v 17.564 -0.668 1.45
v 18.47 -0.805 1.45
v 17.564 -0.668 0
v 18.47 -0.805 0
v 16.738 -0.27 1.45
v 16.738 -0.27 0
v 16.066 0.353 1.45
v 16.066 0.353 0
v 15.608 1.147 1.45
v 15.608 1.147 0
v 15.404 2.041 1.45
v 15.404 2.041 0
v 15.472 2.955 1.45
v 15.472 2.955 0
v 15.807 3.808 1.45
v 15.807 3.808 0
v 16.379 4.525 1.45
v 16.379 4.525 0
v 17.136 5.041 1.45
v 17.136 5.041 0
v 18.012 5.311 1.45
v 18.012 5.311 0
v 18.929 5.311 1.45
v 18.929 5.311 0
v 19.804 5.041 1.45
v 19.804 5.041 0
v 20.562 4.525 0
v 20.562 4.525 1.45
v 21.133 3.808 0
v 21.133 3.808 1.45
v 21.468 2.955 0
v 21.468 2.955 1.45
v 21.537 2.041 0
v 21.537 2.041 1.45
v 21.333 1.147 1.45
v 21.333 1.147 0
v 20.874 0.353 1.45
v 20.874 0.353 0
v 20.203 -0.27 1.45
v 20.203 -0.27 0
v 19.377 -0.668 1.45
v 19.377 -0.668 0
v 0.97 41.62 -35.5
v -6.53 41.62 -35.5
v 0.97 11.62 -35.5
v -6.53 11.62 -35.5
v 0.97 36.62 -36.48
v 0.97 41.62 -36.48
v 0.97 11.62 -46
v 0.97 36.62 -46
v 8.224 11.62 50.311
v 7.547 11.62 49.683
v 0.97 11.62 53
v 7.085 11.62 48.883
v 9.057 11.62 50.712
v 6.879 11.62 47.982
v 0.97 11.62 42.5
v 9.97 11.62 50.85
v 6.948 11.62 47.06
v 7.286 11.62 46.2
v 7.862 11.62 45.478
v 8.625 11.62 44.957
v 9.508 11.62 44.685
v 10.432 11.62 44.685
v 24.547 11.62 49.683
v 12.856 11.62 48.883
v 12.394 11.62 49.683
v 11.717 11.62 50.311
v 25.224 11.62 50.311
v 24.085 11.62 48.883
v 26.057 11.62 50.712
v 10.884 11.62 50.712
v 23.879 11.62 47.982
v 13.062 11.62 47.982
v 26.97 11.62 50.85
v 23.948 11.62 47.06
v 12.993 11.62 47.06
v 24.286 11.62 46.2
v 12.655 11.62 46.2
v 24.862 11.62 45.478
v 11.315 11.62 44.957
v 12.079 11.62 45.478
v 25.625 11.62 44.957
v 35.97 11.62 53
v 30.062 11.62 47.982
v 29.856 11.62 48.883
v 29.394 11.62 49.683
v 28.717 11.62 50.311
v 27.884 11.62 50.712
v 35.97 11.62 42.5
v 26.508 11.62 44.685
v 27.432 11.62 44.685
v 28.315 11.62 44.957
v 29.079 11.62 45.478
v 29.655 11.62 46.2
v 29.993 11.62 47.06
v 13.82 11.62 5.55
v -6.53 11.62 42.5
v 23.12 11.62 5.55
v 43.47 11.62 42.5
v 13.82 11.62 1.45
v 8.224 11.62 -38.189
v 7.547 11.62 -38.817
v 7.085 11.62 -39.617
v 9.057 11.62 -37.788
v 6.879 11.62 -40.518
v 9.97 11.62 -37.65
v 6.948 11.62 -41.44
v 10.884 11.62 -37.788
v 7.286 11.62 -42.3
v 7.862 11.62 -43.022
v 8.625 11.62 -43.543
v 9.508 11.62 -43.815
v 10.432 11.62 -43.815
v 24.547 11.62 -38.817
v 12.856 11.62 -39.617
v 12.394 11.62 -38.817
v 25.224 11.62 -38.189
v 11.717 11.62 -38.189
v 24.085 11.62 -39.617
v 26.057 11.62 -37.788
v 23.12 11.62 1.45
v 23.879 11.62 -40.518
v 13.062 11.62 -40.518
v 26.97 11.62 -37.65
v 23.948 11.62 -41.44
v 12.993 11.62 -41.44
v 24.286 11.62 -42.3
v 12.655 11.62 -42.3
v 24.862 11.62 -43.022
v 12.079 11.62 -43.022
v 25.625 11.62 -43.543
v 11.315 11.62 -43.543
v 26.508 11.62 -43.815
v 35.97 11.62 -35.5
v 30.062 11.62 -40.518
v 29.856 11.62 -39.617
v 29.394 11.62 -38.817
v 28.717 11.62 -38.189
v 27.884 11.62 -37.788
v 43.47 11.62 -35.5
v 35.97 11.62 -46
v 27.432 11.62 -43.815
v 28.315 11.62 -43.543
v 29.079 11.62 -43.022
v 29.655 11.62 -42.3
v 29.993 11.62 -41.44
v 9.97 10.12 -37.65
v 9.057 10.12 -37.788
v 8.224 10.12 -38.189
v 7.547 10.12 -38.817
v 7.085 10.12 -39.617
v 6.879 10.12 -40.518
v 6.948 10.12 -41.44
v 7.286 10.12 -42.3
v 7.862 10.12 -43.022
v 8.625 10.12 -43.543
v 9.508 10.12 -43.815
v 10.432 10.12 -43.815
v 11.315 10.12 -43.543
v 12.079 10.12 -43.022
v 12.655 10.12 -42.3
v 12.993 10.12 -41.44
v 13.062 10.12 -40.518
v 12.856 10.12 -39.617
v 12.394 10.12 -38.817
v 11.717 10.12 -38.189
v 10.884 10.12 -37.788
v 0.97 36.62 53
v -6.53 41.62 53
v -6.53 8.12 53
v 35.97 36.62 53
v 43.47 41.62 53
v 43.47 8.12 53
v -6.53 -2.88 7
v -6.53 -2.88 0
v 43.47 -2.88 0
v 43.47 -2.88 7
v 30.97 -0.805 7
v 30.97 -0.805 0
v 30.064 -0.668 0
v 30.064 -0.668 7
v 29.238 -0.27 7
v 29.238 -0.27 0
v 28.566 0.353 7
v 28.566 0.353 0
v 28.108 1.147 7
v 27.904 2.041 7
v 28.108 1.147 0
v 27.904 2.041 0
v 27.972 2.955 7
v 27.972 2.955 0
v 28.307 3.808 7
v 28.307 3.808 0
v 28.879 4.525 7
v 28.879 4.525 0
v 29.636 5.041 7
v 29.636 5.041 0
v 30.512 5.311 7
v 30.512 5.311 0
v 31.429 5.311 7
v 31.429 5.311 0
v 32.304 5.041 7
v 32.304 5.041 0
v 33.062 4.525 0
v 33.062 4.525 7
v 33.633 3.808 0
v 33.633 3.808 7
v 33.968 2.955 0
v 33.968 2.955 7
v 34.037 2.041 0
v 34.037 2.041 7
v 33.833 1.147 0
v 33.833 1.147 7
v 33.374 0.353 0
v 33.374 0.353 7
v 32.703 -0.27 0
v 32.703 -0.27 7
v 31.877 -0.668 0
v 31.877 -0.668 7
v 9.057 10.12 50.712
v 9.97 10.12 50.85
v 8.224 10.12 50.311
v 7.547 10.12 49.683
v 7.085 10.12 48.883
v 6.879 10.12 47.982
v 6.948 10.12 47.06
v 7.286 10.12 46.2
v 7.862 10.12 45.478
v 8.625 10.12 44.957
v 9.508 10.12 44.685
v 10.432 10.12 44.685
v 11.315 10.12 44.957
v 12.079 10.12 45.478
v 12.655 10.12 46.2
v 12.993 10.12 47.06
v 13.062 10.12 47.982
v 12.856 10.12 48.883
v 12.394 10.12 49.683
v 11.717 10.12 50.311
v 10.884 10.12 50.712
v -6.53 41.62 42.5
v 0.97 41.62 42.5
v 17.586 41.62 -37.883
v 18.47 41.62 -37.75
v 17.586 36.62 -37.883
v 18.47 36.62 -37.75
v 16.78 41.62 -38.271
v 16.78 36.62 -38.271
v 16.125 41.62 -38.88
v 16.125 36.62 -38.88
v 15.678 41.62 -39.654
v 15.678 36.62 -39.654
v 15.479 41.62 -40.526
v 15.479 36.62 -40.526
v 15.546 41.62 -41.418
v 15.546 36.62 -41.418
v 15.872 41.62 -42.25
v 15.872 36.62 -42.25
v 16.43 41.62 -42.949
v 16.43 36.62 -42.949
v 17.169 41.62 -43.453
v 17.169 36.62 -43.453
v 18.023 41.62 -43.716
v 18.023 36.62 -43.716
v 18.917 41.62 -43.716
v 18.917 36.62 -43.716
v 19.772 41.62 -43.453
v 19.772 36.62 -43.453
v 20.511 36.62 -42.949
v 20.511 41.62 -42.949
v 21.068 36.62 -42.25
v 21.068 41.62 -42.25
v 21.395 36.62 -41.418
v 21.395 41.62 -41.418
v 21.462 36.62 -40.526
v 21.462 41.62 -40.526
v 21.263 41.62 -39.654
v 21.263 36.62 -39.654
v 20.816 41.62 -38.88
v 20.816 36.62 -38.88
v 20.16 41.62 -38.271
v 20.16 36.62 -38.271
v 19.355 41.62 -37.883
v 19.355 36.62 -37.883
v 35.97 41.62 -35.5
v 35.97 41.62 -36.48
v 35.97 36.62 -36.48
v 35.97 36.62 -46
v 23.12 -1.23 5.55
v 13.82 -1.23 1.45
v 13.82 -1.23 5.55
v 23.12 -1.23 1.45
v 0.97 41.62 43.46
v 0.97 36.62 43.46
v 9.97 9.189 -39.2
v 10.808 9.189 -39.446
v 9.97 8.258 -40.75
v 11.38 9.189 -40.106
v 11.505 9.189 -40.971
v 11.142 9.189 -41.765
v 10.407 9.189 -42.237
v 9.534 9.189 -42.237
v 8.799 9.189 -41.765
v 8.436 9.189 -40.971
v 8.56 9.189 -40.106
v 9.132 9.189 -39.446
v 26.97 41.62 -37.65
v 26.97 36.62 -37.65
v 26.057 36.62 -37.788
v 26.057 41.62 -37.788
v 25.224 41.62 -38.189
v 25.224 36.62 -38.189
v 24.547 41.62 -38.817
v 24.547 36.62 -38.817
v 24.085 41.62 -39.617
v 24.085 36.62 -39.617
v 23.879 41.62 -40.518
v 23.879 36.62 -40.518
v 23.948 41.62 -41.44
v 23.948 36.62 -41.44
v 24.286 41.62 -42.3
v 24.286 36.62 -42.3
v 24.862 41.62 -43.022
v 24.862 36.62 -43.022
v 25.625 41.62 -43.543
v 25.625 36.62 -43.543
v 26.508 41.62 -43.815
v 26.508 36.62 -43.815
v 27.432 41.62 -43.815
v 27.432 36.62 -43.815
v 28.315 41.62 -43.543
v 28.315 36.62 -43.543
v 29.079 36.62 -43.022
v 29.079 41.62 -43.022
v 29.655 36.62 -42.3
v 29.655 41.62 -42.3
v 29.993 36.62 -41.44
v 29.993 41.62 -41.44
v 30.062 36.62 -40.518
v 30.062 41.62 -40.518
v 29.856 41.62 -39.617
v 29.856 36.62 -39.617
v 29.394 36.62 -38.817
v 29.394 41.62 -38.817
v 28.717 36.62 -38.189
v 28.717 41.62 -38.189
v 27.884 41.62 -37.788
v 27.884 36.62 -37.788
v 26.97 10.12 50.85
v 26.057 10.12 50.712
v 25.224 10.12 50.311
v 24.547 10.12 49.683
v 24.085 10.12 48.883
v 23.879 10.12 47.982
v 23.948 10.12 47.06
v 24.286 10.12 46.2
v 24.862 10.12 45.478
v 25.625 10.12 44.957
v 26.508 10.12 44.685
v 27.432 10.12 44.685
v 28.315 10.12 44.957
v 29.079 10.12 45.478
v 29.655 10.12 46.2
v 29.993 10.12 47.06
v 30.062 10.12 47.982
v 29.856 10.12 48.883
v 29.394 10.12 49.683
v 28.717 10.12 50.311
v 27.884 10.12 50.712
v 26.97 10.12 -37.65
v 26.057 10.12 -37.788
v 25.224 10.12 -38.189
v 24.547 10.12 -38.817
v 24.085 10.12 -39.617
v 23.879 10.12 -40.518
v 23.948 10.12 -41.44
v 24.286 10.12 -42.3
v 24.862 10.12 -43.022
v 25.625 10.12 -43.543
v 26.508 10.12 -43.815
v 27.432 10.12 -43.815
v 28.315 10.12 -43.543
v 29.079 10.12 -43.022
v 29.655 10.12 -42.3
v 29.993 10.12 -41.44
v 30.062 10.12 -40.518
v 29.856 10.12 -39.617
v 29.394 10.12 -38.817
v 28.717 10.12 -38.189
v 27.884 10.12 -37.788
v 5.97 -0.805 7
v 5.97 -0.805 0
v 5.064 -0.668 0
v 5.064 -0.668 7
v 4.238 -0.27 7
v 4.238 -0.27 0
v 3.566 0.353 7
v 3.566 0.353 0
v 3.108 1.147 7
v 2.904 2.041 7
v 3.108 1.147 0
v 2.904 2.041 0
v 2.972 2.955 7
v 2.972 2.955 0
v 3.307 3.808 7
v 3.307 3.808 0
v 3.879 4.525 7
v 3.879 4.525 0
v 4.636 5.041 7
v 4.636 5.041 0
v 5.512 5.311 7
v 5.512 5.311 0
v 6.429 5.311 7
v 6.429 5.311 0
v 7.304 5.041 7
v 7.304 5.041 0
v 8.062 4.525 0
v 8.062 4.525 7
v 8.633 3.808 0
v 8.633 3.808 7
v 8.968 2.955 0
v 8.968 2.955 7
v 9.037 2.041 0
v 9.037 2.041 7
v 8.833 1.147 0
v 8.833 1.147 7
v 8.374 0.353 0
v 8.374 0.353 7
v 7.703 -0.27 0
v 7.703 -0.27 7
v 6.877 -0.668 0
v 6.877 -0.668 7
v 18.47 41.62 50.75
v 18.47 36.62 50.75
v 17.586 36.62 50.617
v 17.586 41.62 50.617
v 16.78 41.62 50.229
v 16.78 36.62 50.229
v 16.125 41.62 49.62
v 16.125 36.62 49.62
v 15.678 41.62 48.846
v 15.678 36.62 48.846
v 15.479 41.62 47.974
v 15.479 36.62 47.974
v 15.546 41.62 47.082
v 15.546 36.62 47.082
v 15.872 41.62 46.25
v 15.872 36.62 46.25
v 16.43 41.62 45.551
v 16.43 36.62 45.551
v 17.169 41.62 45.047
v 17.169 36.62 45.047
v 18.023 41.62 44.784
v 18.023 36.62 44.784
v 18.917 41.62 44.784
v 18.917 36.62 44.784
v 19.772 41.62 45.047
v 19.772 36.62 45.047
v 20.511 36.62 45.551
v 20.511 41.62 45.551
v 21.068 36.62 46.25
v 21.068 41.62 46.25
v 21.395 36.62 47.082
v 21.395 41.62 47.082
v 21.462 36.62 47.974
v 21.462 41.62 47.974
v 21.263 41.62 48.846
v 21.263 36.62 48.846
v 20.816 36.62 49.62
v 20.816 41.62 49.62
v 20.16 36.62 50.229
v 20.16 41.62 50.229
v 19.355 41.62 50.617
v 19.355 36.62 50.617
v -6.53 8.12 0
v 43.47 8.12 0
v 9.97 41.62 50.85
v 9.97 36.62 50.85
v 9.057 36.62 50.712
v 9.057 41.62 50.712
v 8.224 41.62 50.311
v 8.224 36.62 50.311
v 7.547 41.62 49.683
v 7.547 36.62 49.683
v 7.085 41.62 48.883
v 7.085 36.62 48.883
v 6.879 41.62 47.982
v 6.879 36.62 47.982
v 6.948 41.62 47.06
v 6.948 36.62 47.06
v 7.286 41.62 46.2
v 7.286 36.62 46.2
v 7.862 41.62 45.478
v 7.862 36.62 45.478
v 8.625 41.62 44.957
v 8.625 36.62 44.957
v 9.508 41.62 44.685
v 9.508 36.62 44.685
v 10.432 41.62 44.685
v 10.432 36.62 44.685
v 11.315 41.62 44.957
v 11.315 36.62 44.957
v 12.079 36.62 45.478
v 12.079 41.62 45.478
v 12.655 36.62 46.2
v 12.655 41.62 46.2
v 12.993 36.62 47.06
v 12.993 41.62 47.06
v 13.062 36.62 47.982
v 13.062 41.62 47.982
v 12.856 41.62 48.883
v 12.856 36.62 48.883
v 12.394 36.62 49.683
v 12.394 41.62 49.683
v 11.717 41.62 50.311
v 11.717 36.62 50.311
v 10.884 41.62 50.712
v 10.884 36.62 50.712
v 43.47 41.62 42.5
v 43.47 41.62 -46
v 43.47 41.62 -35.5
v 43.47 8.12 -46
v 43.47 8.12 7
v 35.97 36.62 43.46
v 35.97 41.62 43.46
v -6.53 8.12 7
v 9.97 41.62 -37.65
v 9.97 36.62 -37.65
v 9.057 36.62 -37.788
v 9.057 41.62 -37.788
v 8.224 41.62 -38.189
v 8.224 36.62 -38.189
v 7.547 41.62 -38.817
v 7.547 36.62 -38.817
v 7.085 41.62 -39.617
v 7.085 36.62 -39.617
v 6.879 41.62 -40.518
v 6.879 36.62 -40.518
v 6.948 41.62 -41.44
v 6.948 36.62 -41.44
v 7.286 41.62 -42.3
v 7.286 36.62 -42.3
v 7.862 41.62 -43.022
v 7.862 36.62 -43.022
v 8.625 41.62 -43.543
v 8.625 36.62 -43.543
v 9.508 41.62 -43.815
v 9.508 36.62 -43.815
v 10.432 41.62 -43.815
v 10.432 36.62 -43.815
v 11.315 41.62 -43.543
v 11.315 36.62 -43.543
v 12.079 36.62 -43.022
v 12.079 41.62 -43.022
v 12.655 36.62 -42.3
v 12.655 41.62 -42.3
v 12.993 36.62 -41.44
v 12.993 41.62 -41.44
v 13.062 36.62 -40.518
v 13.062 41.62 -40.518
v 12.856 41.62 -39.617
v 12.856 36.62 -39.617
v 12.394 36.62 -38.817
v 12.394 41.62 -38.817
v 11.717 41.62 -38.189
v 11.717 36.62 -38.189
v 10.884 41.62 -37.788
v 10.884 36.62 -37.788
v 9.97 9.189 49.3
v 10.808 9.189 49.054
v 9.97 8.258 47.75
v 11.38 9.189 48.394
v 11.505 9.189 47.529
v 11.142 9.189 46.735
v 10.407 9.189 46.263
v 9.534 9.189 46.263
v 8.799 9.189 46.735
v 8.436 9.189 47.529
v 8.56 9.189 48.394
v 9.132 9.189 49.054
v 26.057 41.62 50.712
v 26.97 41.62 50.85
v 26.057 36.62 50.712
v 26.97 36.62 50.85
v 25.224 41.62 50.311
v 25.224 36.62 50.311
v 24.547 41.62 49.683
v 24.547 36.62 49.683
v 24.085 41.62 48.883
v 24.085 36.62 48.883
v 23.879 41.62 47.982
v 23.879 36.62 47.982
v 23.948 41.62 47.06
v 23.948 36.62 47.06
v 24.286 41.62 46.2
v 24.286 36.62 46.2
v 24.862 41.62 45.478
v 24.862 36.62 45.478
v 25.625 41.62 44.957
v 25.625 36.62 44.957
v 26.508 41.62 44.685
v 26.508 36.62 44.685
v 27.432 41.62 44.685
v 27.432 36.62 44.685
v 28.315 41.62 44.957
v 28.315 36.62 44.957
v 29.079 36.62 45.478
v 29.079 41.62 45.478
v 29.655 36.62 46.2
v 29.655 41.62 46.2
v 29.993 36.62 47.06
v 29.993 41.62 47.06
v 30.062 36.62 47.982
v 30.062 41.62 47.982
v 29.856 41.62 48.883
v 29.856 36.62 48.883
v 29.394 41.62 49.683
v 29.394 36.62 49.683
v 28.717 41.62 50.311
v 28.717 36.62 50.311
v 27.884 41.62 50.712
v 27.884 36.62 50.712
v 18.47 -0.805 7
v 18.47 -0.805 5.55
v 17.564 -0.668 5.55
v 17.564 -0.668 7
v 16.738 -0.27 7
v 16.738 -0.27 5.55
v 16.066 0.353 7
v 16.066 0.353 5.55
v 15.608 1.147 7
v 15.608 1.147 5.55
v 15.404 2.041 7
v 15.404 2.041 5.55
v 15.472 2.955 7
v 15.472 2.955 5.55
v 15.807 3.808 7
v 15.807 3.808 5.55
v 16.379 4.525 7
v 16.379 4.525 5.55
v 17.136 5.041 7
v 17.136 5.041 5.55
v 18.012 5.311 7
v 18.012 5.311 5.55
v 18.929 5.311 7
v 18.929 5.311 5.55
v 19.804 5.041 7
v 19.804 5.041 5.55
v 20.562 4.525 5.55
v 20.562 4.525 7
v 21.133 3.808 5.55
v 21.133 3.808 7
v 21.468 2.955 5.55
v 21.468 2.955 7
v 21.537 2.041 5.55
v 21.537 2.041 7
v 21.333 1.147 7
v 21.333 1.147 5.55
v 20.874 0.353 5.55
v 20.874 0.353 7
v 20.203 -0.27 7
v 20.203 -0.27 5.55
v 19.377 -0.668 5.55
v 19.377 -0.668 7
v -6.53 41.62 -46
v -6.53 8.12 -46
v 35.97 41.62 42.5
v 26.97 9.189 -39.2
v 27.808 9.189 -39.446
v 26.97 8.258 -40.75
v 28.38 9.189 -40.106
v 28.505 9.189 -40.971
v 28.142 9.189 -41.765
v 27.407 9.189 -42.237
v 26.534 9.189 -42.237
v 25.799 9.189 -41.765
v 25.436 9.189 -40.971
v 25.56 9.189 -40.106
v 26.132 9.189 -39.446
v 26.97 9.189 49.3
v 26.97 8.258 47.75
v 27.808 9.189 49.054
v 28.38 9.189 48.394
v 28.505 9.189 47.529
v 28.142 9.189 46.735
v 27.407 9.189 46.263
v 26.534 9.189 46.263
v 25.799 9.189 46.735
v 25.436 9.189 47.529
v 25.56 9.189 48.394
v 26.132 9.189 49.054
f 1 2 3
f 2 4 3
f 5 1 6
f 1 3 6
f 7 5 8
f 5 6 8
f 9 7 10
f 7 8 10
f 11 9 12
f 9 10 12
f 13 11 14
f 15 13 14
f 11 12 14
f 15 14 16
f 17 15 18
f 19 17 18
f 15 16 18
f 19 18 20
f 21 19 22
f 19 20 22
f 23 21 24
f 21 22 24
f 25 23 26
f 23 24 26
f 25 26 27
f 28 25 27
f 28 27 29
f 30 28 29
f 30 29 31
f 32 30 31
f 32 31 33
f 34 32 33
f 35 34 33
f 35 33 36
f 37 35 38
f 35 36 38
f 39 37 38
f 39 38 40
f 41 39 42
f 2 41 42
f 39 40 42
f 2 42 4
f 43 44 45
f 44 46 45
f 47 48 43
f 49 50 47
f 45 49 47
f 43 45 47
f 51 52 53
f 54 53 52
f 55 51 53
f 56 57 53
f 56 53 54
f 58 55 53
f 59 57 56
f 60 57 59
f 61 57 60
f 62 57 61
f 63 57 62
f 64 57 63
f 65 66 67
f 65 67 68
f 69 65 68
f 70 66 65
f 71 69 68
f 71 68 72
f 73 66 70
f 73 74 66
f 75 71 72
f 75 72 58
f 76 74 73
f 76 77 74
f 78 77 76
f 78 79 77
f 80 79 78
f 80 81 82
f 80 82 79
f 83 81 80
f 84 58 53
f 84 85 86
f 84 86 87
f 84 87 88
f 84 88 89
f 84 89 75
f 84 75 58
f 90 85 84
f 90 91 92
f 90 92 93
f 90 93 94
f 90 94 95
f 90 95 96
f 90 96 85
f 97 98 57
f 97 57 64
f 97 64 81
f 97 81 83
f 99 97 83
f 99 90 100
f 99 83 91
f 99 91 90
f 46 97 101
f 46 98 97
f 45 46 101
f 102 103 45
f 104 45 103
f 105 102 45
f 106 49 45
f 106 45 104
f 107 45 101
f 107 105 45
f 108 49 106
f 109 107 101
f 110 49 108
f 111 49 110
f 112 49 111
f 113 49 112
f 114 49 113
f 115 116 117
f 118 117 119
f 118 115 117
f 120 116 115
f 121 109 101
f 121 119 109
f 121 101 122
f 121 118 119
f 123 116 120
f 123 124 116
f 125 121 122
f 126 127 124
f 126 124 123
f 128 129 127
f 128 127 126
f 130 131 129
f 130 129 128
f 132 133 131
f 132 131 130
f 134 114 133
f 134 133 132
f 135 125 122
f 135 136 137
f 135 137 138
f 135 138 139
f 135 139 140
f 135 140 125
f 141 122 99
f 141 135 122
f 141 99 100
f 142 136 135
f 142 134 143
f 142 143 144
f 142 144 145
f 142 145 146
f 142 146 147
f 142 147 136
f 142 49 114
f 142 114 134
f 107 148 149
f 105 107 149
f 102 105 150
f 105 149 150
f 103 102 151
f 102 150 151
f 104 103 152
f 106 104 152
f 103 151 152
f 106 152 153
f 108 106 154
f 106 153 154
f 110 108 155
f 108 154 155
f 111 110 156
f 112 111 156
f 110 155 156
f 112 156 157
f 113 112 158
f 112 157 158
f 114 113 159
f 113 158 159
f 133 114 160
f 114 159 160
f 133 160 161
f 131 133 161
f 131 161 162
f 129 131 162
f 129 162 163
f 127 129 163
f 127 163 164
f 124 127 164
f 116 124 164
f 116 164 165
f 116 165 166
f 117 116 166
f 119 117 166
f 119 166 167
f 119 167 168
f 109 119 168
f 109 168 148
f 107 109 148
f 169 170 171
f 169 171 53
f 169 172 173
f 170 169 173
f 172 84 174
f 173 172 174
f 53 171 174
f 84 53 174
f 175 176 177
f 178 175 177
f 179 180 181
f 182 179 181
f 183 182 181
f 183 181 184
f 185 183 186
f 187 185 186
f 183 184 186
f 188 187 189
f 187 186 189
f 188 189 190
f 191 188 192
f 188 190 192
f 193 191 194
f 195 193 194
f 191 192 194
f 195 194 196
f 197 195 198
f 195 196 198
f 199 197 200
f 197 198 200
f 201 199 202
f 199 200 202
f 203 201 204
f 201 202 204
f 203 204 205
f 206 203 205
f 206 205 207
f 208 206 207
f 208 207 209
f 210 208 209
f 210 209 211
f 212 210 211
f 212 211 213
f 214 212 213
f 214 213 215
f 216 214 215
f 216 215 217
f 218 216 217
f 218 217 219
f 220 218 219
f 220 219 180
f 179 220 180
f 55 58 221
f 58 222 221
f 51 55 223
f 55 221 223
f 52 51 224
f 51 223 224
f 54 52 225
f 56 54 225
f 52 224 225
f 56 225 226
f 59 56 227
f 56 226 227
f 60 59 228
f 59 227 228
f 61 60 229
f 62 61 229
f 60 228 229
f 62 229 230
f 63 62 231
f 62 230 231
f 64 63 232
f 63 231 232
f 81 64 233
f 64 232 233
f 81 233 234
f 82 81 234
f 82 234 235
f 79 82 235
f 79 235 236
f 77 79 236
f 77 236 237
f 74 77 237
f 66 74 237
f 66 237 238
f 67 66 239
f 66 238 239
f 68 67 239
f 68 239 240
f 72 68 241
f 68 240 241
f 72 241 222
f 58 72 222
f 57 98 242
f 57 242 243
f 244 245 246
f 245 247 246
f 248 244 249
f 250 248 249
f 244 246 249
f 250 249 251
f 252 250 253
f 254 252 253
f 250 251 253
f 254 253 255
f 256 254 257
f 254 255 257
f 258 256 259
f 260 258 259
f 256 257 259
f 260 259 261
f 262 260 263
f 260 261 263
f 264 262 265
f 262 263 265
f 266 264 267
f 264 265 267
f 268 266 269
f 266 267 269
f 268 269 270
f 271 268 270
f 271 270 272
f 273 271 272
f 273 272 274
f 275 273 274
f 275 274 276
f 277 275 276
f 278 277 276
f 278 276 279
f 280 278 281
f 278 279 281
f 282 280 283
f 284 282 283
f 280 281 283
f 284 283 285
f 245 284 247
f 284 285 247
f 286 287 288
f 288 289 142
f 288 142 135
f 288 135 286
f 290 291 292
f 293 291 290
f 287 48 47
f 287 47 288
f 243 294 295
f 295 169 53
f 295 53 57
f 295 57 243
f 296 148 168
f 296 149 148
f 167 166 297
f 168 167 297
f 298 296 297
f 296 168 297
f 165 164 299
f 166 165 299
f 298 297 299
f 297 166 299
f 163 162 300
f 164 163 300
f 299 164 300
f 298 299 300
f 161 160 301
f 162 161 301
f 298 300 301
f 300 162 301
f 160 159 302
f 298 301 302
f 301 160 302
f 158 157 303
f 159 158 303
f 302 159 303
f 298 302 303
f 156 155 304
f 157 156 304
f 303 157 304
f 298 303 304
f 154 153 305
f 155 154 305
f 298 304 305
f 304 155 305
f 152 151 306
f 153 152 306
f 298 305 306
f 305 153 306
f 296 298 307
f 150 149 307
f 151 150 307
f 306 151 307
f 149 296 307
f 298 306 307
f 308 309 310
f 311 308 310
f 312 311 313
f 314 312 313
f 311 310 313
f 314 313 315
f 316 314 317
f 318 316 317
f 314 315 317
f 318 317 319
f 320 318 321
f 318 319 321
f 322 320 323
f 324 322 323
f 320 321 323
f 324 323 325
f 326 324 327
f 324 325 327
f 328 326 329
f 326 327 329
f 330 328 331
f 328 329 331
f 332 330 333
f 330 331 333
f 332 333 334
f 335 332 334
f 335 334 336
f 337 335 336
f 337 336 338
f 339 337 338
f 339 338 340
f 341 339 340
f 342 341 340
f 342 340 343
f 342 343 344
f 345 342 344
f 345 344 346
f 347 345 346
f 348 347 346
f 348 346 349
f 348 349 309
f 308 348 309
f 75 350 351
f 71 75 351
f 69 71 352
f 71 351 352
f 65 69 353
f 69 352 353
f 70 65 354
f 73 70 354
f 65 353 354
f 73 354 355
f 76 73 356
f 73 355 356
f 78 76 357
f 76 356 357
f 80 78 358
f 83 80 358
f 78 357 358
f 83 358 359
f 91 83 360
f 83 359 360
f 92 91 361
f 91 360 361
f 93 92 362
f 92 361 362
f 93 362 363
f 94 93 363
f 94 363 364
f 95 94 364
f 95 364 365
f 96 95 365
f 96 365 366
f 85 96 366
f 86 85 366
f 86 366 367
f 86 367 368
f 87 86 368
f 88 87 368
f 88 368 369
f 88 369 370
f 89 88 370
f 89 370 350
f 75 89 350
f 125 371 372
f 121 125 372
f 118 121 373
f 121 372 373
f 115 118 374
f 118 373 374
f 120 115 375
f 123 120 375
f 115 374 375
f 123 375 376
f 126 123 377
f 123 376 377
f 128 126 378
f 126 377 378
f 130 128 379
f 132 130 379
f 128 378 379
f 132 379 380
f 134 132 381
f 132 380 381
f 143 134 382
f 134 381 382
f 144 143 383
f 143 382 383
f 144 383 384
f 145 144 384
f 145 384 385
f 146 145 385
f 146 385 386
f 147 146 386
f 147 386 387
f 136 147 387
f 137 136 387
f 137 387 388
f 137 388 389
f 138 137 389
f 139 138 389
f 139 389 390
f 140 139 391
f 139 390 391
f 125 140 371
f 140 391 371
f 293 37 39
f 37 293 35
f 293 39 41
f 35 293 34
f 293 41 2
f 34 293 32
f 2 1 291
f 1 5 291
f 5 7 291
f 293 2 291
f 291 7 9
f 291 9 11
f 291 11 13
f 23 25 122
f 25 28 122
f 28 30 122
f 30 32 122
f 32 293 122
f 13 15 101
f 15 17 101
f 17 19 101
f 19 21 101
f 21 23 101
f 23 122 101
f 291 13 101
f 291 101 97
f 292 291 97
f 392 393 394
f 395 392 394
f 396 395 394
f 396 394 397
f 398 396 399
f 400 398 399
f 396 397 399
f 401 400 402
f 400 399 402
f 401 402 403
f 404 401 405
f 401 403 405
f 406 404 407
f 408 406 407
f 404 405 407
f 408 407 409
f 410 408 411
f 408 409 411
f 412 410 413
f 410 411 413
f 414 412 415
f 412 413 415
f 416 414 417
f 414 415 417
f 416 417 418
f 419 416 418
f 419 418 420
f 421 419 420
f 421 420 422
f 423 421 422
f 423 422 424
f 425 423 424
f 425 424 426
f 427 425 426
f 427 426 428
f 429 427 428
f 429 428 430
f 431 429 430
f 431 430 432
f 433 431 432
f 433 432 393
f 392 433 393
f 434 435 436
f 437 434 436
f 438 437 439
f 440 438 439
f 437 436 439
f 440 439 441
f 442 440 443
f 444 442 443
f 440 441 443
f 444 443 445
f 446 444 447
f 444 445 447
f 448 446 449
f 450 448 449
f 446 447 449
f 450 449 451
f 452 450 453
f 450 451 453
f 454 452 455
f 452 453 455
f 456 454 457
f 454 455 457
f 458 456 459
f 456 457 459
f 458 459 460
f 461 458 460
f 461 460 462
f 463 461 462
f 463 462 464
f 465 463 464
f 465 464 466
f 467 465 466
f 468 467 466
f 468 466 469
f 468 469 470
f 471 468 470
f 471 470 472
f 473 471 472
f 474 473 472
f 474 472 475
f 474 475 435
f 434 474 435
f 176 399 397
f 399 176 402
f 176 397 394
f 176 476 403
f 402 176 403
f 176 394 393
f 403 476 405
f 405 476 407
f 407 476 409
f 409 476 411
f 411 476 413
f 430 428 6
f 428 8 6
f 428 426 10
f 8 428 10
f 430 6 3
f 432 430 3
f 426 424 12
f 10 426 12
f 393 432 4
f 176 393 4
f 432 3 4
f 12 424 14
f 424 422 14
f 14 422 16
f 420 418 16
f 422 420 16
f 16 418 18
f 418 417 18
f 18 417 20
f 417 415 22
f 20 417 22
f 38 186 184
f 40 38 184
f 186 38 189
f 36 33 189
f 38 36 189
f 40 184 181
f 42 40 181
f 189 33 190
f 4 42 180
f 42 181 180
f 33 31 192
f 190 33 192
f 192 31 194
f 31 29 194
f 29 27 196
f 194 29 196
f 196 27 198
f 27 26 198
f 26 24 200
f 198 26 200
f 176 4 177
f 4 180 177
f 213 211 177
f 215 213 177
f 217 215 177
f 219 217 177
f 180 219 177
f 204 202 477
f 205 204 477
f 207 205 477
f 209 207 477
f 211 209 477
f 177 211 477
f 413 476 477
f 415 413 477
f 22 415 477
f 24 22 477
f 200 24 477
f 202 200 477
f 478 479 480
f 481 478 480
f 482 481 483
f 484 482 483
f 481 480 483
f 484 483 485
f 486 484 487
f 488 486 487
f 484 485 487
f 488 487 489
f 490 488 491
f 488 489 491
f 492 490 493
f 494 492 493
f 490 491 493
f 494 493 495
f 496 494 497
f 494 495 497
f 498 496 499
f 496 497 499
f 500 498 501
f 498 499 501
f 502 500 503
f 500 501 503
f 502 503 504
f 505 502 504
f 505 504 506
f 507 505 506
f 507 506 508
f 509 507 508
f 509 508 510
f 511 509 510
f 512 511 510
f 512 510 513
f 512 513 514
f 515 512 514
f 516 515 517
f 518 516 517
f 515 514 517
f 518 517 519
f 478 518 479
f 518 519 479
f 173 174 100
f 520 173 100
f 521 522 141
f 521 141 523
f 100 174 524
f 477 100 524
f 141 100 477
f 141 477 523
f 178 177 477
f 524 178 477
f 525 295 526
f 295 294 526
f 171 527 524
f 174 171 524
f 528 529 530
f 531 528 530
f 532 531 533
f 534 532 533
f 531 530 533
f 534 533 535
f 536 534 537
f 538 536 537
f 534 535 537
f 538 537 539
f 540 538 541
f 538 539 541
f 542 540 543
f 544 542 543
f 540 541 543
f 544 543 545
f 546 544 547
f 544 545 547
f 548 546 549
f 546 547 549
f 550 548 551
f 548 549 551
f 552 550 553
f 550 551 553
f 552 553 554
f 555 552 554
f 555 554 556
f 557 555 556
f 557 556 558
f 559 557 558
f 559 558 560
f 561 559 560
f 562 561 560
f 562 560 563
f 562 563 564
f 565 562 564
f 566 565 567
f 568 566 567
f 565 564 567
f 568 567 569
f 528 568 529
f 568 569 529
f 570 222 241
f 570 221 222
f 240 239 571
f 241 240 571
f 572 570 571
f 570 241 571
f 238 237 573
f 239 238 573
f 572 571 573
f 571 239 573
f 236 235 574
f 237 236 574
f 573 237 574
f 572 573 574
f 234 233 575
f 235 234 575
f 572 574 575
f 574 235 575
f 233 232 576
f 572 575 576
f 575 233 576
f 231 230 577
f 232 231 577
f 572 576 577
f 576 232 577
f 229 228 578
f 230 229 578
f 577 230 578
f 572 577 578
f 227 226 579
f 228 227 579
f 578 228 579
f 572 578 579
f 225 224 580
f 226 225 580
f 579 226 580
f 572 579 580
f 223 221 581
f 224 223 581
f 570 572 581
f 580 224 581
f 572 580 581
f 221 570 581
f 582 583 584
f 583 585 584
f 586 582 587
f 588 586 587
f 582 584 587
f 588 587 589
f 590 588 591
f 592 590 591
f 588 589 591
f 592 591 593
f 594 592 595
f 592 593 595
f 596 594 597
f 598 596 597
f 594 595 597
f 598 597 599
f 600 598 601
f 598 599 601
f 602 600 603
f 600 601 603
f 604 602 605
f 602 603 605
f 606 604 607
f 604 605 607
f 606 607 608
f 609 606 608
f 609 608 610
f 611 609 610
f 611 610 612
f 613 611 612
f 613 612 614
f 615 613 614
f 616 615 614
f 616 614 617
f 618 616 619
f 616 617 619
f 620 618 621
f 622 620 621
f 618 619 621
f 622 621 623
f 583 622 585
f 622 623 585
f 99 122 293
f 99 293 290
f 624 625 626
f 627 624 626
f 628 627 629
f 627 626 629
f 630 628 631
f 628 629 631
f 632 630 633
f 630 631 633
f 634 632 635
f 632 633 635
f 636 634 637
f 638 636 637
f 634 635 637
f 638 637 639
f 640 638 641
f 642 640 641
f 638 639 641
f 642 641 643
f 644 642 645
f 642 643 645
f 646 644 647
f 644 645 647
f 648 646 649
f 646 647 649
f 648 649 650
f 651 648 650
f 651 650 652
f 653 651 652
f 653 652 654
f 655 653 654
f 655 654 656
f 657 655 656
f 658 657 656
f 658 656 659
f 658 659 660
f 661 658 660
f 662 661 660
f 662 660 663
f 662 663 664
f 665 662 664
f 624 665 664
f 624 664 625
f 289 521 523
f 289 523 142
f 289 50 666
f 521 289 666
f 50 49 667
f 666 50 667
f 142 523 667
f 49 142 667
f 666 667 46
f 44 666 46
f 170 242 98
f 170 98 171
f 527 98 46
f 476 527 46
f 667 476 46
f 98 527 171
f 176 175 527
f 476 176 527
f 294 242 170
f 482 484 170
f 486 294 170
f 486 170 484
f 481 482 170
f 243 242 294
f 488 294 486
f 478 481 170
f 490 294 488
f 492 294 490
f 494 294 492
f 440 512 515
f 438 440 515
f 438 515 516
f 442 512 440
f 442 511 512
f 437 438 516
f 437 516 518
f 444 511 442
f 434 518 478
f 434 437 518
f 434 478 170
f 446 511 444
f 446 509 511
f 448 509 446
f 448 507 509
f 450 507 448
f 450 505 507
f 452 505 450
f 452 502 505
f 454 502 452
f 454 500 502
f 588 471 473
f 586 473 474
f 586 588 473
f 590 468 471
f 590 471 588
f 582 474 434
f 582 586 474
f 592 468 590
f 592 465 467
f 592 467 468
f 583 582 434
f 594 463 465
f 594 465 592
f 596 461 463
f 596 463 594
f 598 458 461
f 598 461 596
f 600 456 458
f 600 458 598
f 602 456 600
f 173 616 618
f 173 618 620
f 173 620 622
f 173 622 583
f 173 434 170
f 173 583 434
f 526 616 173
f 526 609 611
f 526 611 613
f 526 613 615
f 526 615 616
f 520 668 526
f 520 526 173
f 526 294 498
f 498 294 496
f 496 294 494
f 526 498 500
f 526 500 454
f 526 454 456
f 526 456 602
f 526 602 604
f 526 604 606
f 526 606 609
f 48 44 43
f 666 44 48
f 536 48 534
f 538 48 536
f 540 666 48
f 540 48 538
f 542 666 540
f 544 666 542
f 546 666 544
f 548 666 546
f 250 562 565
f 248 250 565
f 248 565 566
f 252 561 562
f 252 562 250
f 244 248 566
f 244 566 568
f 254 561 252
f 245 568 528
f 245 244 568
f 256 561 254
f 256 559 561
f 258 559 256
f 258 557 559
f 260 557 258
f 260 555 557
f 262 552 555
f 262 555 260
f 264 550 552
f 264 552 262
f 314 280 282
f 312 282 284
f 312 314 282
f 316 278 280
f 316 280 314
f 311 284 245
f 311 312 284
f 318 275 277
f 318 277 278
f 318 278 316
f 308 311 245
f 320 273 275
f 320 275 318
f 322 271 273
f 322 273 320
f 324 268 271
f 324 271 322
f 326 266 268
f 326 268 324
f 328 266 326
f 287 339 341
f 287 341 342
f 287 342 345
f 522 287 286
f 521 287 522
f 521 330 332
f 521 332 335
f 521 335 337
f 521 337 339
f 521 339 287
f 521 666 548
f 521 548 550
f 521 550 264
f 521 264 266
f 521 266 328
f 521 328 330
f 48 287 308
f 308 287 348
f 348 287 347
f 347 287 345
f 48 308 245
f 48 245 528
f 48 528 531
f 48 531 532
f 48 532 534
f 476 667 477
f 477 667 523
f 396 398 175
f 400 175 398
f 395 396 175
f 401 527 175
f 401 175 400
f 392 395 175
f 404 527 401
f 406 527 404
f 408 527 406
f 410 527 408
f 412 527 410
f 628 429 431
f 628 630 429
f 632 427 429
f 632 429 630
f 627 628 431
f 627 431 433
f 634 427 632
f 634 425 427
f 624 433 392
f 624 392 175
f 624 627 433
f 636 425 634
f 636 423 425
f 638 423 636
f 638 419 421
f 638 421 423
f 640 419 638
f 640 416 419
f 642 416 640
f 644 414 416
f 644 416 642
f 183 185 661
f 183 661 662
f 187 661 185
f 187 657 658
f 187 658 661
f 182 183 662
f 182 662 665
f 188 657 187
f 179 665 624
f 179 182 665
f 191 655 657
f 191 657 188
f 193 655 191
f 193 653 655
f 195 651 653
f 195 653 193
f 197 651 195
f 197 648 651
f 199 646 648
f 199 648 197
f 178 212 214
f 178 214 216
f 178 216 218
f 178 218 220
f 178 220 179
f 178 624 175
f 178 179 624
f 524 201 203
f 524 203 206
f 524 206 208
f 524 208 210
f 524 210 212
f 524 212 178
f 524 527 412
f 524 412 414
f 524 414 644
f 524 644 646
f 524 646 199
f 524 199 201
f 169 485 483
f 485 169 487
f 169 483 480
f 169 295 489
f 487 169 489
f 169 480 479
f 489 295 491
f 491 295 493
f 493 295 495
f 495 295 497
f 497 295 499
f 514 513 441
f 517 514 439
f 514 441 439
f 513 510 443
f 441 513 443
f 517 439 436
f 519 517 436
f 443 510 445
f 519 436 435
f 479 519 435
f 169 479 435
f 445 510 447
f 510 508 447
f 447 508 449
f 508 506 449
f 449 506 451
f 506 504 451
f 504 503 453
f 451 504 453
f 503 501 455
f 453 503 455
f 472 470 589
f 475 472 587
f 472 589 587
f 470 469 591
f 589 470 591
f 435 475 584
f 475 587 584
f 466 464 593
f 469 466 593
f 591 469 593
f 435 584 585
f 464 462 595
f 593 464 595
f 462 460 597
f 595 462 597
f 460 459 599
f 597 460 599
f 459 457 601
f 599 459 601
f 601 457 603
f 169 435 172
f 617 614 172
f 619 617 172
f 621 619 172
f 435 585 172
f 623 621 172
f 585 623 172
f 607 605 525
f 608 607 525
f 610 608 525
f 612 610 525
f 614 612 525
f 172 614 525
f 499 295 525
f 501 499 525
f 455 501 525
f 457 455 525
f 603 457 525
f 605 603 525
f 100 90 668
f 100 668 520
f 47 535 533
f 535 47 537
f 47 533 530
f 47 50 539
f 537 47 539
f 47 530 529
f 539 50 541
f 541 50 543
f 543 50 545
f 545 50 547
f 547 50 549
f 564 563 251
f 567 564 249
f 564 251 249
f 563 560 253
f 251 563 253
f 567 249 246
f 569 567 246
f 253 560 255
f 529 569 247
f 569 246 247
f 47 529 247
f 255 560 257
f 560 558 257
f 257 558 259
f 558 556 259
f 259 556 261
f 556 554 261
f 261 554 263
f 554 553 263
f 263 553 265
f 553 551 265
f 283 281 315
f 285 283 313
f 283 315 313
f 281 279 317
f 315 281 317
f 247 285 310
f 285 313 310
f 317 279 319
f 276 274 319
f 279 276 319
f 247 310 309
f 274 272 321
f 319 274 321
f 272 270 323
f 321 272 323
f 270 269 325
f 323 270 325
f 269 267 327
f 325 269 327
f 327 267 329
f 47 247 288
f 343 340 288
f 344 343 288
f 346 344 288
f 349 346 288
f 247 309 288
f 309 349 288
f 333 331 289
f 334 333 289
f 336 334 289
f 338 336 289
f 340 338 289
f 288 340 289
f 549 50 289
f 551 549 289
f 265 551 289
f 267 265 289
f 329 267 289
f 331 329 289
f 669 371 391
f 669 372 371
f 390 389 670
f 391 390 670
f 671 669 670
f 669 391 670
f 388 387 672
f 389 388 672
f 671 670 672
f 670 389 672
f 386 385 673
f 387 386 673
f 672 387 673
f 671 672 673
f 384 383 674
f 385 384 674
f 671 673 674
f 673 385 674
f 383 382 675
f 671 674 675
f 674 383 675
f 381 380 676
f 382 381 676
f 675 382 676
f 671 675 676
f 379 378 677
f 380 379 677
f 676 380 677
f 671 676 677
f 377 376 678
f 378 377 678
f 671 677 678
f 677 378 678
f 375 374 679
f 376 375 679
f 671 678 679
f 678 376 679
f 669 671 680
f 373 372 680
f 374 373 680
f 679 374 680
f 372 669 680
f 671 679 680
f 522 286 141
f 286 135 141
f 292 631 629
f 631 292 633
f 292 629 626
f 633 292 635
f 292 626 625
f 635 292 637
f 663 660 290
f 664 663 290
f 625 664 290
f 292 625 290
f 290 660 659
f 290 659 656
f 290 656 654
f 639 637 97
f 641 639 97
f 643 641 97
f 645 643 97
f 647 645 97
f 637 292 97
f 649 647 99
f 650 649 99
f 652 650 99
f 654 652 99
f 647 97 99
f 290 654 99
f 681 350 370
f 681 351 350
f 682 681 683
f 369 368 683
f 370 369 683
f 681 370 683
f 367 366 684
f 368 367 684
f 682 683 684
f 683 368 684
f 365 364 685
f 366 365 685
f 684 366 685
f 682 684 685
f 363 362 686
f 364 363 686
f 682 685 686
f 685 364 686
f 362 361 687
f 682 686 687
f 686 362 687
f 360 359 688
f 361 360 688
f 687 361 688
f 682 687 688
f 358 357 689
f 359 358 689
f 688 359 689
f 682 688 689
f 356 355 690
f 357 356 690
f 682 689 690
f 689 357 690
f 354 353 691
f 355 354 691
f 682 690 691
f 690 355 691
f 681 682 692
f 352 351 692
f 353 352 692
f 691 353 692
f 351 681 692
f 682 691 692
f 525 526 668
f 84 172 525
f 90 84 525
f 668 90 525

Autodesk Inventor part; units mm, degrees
ref_plane "YZ Plane" through (0, 0, 0) normal (1, 0, 0) x (0, 1, 0)
ref_plane "XZ Plane" through (0, 0, 0) normal (0, 1, 0) x (-1, 0, 0)
ref_plane "XY Plane" through (0, 0, 0) normal (0, 0, 1) x (1, 0, 0)
sketch "Skizze1" plane through (0, 0, 0) normal (0, 0, 1) x (1, 0, 0)
  line L0 (-6.5297, -2.8796) -> (43.4703, -2.8796)
  line L1 (43.4703, -2.8796) -> (43.4703, 8.1204)
  line L2 (43.4703, 8.1204) -> (-6.5297, 8.1204)
  line L3 (-6.5297, 8.1204) -> (-6.5297, -2.8796)
  point P0 (0, 0)
  dimension "d0" = 50
  dimension "d1" = 11
extrude "Extrusion1" add sketch "Skizze1" along normal blind 7
sketch "Skizze2" plane through (-6.5297, 8.1204, 0) normal (0, 1, 0) x (1, 0, 0)
  line L0 (29.65, -5.55) -> (20.35, -5.55)
  line L1 (20.35, -5.55) -> (20.35, -1.45)
  line L2 (20.35, -1.45) -> (29.65, -1.45)
  line L3 (29.65, -1.45) -> (29.65, -5.55)
  line L4 (50, -7) -> (0, -7) projected
  line L5 (50, 0) -> (50, -7) projected
  line L6 (0, 0) -> (0, -7) projected
  point P0 (6.5297, 0)
  dimension "d4" = 9.3
  dimension "d5" = 4.1
  dimension "d6" = 1.45
  dimension "d7" = 20.35
  dimension "d8" = 20.35
extrude "Extrusion2" cut sketch "Skizze2" against normal blind 9.35
sketch "Skizze3" plane through (0, 0, 7) normal (0, 0, 1) x (1, 0, 0)
  line L0 (-6.5297, 8.1204) -> (-6.5297, -2.8796) projected
  line L1 (43.4703, 8.1204) -> (-6.5297, 8.1204) projected
  point P0 (0, 0)
  point P1 (5.9703, 2.2704)
  point P2 (18.4703, 2.2704)
  point P3 (30.9703, 2.2704)
  dimension "d11" = 12.5
  dimension "d12" = 12.5
  dimension "d13" = 12.5
  dimension "d14" = 5.85
hole "Bohrung1" at (5.9703, 2.2704, 7) at (18.4703, 2.2704, 7) at (30.9703, 2.2704, 7) direction (0, 0, -1) diameter 6.15 end through all
sketch "Skizze4" plane through (-6.5297, 8.1204, 0) normal (0, 1, 0) x (1, 0, 0)
  point P0 (6.5297, 0)
sketch "Skizze5" plane through (-6.5297, 8.1204, 0) normal (0, 1, 0) x (1, 0, 0)
  line L0 (50, 0) -> (0, 0) projected
  line L1 (0, 0) -> (0, -53.0037)
  line L2 (0, -53) -> (50, -53)
  line L3 (50, -53) -> (50, 46)
  line L4 (50, 46) -> (0, 46)
  line L5 (0, 46) -> (0, -53)
  point P0 (6.5297, 0)
  dimension "d22" = 50
  dimension "d23" = 99
  dimension "d24" = 46
extrude "Extrusion3" add sketch "Skizze5" along normal blind 3.5
sketch "Skizze6" plane through (-6.5297, 11.6204, 0) normal (0, 1, 0) x (1, 0, 0)
  line L0 (29.65, -1.45) -> (29.65, -5.55) projected
  line L1 (29.65, -1.45) -> (20.35, -1.45)
  line L2 (20.35, -1.45) -> (20.35, -5.55)
  line L3 (20.35, -5.55) -> (29.65, -5.55)
  line L4 (29.65, -5.55) -> (29.65, -1.45)
  point P0 (6.5297, 0)
extrude "Extrusion4" cut sketch "Skizze6" against normal blind 3.5
sketch "Skizze7" plane through (-6.5297, 11.6204, 0) normal (0, 1, 0) x (1, 0, 0)
  line L0 (0, -53) -> (50, -53) projected
  line L1 (50, -53) -> (42.5, -53)
  line L2 (42.5, -53) -> (42.5, -42.5)
  line L3 (42.5, -42.5) -> (50, -42.5)
  line L4 (50, -42.5) -> (50, -53)
  line L5 (0, -53) -> (7.5, -53)
  line L6 (7.5, -53) -> (7.5, -42.5)
  line L7 (7.5, -42.5) -> (0, -42.5)
  line L8 (0, -42.5) -> (0, -53)
  line L9 (0, 46) -> (0, -53) projected
  line L10 (0, 46) -> (7.5, 46)
  line L11 (7.5, 46) -> (7.5, 35.5)
  line L12 (7.5, 35.5) -> (0, 35.5)
  line L13 (0, 35.5) -> (0, 46)
  line L14 (50, -53) -> (50, 46) projected
  line L15 (50, 46) -> (42.5, 46)
  line L16 (42.5, 46) -> (42.5, 35.5)
  line L17 (42.5, 35.5) -> (50, 35.5)
  line L18 (50, 35.5) -> (50, 46)
  point P0 (6.5297, 0)
  dimension "d29" = 7.5
  dimension "d30" = 10.5
  dimension "d31" = 7.5
  dimension "d32" = 10.5
  dimension "d33" = 7.5
  dimension "d34" = 10.5
  dimension "d35" = 7.5
  dimension "d36" = 10.5
extrude "Extrusion5" add sketch "Skizze7" along normal blind 25
sketch "Skizze8" plane through (0.9703, 11.6204, -35.5) normal (1, 0, 0) x (0, 0, -1)
  point P0 (-35.5, -11.6204)
sketch "Skizze9" plane through (-6.5297, 36.6204, 0) normal (0, 1, 0) x (1, 0, 0)
  line L0 (50, -42.5) -> (50, 35.5) projected
  line L1 (0, 46) -> (50, 46)
  line L2 (50, 46) -> (50, 35.5)
  line L3 (50, 35.5) -> (0, 35.5)
  line L4 (0, 35.5) -> (0, 46)
  line L5 (50, -53) -> (50, -7) projected
  line L6 (0, -42.5) -> (50, -42.5)
  line L7 (50, -42.5) -> (50, -53)
  line L8 (50, -53) -> (0, -53)
  line L9 (0, -53) -> (0, -42.5)
  line L10 (50, -42.5) -> (42.5, -42.5) projected
  point P0 (6.5297, 0)
  dimension "d75" = 0
extrude "Extrusion6" add sketch "Skizze9" along normal blind 5
sketch "Skizze10" plane through (-6.5297, 41.6204, 0) normal (0, 1, 0) x (1, 0, 0)
  line L0 (50, 46) -> (0, 46) projected
  line L1 (0, -53) -> (50, -53) projected
  line L2 (42.5, -42.5) -> (42.5, -53) projected
  line L3 (42.5, 46) -> (42.5, 35.5) projected
  line L4 (7.5, 35.5) -> (7.5, 46) projected
  line L5 (7.5, -53) -> (7.5, -42.5) projected
  point P0 (6.5297, 0)
  point P1 (15.7518, 40.75)
  point P2 (25, 40.75)
  point P3 (33.5, 40.75)
  point P4 (15.6745, -47.75)
  point P5 (25, -47.75)
  point P6 (33.5, -47.75)
  dimension "d41" = 5.25
  dimension "d42" = 5.25
  dimension "d43" = 5.25
  dimension "d44" = 5.25
  dimension "d45" = 5.25
  dimension "d46" = 5.25
  dimension "d47" = 9
  dimension "d50" = 9
  dimension "d76" = 17.5
  dimension "d77" = 17.5
hole "Bohrung2" at (18.4703, 41.6204, 47.75) at (18.4703, 41.6204, -40.75) direction (0, -1, 0) diameter 6 depth 10 tip angle 118
sketch "Skizze11" plane through (-6.5297, 41.6204, 0) normal (0, 1, 0) x (1, 0, 0)
  line L0 (7.5, -53) -> (7.5, -42.5) projected
  line L1 (42.5, -42.5) -> (42.5, -53) projected
  line L2 (50, -42.5) -> (0, -42.5) projected
  line L3 (50, 46) -> (0, 46) projected
  line L4 (42.5, 46) -> (42.5, 35.5) projected
  line L5 (7.5, 35.5) -> (7.5, 46) projected
  point P0 (6.5297, 0)
  point P1 (16.5, -47.75)
  point P2 (33.5, -47.75)
  point P3 (16.5, 40.75)
  point P4 (33.5, 40.75)
  dimension "d60" = 9
  dimension "d61" = 9
  dimension "d62" = 5.25
  dimension "d63" = 5.25
  dimension "d64" = 5.25
  dimension "d65" = 5.25
  dimension "d66" = 9
  dimension "d67" = 9
hole "Bohrung3" at (9.9703, 41.6204, 47.75) at (26.9703, 41.6204, 47.75) at (9.9703, 41.6204, -40.75) at (26.9703, 41.6204, -40.75) direction (0, -1, 0) diameter 6.2 depth 31.5 tip angle 118
sketch "Skizze12" plane through (-6.5297, -2.8796, 0) normal (0, -1, 0) x (1, 0, 0)
  point P0 (6.5297, 0)
sketch "Skizze13" plane through (-6.5297, 41.6204, 0) normal (0, 1, 0) x (1, 0, 0)
  line L0 (42.5, -53) -> (42.5, -42.5) projected
  line L1 (7.5, -42.5) -> (7.5, -53) projected
  line L2 (42.5, -42.5) -> (7.5, -42.5)
  line L3 (7.5, -42.5) -> (7.5, -43.46)
  line L4 (7.5, -43.46) -> (42.5, -43.46)
  line L5 (42.5, -43.46) -> (42.5, -42.5)
  point P0 (6.5297, 0)
  dimension "d78" = 0.96
extrude "Extrusion7" cut sketch "Skizze13" against normal blind 10
sketch "Skizze14" plane through (35.9703, 11.6204, -35.5) normal (0, 0, 1) x (1, 0, 0)
  point P0 (-35.9703, -11.6204)
sketch "Skizze15" plane through (-6.5297, 41.6204, 0) normal (0, 1, 0) x (1, 0, 0)
  line L0 (7.5, 46) -> (7.5, 35.5) projected
  line L1 (42.5, 35.5) -> (7.5, 35.5)
  line L2 (7.5, 35.5) -> (7.5, 36.48)
  line L3 (7.5, 36.48) -> (42.5, 36.48)
  line L4 (42.5, 36.48) -> (42.5, 35.5)
  line L5 (0, 35.5) -> (50, 35.5) projected
  point P0 (6.5297, 0)
  dimension "d81" = 0.98
  dimension "d82" = 0
extrude "Extrusion8" cut sketch "Skizze15" against normal blind 10
properties part number "Objektträgerhalter 1.1 final"
